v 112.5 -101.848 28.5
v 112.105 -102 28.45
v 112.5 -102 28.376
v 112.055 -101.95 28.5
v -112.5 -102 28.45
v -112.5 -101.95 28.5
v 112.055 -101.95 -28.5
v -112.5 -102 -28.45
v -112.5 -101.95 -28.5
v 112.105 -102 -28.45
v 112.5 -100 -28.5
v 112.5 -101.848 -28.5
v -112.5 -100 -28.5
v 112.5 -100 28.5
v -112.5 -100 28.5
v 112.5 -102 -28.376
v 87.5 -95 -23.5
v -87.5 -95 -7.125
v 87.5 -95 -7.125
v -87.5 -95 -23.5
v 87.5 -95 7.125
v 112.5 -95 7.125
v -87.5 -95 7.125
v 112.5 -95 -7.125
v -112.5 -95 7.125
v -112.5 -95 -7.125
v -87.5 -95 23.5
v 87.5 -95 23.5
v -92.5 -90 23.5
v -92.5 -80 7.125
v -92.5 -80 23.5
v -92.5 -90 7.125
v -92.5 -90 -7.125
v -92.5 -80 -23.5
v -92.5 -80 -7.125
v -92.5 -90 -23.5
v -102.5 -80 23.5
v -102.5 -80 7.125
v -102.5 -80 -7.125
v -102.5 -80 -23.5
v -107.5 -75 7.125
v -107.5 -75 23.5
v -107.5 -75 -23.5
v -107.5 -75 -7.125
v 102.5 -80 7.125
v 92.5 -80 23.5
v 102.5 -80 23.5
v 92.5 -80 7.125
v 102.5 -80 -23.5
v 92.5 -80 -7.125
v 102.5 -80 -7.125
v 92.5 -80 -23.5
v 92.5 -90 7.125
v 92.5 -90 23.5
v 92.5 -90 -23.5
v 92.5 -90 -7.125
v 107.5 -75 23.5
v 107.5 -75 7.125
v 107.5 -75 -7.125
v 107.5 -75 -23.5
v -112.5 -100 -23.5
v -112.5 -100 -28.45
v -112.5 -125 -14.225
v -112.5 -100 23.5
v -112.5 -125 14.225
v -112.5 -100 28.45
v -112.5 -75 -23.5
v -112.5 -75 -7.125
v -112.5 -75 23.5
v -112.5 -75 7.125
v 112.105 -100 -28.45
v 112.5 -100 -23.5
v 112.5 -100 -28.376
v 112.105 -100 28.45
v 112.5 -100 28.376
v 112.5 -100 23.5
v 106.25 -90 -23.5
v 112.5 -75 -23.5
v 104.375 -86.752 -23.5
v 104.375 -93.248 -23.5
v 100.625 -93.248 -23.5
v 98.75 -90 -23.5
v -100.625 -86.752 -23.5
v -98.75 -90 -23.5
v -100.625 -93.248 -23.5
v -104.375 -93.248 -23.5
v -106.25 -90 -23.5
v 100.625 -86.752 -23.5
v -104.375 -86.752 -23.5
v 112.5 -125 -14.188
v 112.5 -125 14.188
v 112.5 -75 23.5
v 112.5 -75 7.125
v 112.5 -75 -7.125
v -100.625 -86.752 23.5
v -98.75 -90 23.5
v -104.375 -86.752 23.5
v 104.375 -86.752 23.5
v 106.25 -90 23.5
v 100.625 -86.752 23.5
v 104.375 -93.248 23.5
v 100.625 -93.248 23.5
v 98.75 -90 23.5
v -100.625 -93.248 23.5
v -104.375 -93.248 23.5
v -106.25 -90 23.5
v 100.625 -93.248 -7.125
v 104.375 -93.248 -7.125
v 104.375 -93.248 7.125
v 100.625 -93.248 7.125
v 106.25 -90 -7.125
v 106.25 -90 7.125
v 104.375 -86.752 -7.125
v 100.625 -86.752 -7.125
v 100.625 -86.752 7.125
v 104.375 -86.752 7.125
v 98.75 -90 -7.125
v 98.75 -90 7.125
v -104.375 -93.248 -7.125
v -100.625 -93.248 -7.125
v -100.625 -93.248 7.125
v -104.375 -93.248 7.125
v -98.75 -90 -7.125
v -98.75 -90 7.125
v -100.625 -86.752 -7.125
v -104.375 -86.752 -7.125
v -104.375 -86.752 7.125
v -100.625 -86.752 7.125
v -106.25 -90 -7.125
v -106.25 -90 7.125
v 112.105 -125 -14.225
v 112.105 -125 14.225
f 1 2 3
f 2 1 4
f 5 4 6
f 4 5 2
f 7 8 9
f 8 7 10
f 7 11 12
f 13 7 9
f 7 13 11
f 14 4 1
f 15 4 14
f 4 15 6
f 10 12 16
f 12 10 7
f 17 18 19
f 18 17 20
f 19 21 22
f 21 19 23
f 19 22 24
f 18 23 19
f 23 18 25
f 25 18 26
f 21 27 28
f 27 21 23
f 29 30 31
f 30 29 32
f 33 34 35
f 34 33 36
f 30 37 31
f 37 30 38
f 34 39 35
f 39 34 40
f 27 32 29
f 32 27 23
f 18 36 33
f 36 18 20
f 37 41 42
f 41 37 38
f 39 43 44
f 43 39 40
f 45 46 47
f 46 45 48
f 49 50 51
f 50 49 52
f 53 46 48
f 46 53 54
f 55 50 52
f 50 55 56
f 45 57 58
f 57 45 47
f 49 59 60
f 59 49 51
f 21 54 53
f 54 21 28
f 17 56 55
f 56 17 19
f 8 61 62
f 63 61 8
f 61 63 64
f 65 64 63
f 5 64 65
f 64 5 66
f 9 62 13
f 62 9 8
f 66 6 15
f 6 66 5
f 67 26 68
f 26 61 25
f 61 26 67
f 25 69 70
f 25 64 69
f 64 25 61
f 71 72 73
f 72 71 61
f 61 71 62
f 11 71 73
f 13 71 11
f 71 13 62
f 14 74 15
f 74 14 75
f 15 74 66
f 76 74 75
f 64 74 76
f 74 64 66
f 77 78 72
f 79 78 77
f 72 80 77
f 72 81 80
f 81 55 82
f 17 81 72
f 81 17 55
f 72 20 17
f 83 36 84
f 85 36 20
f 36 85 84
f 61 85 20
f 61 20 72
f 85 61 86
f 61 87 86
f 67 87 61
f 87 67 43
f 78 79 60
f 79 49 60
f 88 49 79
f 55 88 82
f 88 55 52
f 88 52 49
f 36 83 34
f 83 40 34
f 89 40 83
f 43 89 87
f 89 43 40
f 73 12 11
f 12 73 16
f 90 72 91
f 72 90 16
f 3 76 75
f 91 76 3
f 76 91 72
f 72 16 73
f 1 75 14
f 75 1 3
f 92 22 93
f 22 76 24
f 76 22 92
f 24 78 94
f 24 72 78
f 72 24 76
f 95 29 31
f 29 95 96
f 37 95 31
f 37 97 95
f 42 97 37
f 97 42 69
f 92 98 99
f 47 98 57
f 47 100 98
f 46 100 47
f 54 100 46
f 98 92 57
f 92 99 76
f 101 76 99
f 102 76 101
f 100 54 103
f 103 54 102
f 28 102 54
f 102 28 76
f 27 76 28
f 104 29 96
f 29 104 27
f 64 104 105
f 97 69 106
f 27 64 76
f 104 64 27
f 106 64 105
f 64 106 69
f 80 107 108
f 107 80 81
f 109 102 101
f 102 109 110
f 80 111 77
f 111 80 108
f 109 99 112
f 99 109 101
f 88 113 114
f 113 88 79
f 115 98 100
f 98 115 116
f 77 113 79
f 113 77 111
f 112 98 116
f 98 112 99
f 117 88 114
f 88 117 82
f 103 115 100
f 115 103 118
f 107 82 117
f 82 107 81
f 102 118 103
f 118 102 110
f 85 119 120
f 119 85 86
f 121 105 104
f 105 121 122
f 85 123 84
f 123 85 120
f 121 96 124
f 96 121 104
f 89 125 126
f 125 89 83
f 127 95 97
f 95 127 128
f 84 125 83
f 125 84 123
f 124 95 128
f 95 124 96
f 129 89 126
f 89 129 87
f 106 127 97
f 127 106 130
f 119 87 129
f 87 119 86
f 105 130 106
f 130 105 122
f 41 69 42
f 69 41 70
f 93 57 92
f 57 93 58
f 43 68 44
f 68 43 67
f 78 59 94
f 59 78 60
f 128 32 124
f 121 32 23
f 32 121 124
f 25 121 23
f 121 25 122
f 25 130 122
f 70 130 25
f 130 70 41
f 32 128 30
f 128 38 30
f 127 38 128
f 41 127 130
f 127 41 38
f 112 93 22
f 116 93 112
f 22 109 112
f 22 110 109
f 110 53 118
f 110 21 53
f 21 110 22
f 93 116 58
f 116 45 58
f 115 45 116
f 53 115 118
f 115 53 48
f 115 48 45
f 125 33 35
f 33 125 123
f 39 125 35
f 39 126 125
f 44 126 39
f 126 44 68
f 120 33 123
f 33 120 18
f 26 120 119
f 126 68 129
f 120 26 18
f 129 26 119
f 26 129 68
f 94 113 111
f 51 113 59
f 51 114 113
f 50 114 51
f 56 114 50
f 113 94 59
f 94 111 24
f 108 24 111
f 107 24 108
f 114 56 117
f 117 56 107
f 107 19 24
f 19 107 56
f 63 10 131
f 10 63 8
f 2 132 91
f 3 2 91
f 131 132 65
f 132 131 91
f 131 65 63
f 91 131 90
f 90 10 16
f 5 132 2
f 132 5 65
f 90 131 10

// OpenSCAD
// file: frame-left.scad
/*
 * SPDX-FileCopyrightText: © 2023 Brian S. Stephan <bss@incorporeal.org>
 * SPDX-License-Identifier: GPL-3.0-or-later
 */

include <parameters.scad>
include <components.scad>

module base_left_frame(lower=false) {
	difference() {
		frame(lower=lower);
		// chop the right edge off
		side_chopper();
	}
}

module left_frame(lower=false) {
	difference() {
		base_left_frame(lower=lower);
		// connection holes to other frames
		frame_connection_holes();

		// cable routing hole
		frame_cable_routing_hole();

		// aux button holes
		translate([-35, 101.5, 0]) rotate([270, 0, 0]) aux_control_three_button_cluster();
		translate([-35, (frame_y/2)-neutrik_panel_thickness-4, 0]) frame_cutout();
		translate([-72, (frame_y/2)-neutrik_panel_thickness-4, 0]) frame_cutout();
		translate([2, (frame_y/2)-neutrik_panel_thickness-4, 0]) frame_cutout();

		// neutrix button hole
		translate([frame_center_to_neutrik, (frame_y/2)-neutrik_panel_thickness, 0])
			rotate([90, 0, 0]) neutrik_d_mount();
		translate([frame_center_to_neutrik, (frame_y/2)-neutrik_panel_thickness-4, 0])
			frame_cutout();
	}
}

left_frame();
// file: frame-piece-bottom-left-or-right.scad
/*
 * SPDX-FileCopyrightText: © 2024 Brian S. Stephan <bss@incorporeal.org>
 * SPDX-License-Identifier: GPL-3.0-or-later
 */

include <parameters.scad>
include <components.scad>
use <frame-left.scad>

module bottom_left_or_right_frame_piece(lower=false) {
	piece_width = panel_support_width+frame_wall+frame_mount_column_width;
	intersection() {
		left_frame(lower=lower);
		difference() {
			// include the whole bottom wall (including mount columns)
			translate([0, -(frame_y/2)+(piece_width/2), 0]) cube([frame_x, piece_width, frame_z], center=true);
			// ...minus the frame wall and lip on the left
			translate([-frame_x/2+frame_wall/2, 0, 0])
				cube([frame_wall, frame_y, frame_z], center=true);
			// ...minus a slot for the combining piece to go into
			cube([frame_x, frame_y-(panel_support_width+frame_wall)*2, frame_z/4], center=true);
		}
	}
}

bottom_left_or_right_frame_piece();
// file: parameters.scad
/*
 * SPDX-FileCopyrightText: © 2023 Brian S. Stephan <bss@incorporeal.org>
 * SPDX-License-Identifier: GPL-3.0-or-later
 */

// adjustments
hole_tolerance = 0.15;

// M2
m2_screw_selftap_radius = 0.95;

// M3
m3_screw_selftap_radius = 1.3;

// M4
m4_bolt_radius = 2 + hole_tolerance;
m4_bolt_countersink_radius = 6.1 + hole_tolerance;
m4_bolt_hex_exterior_radius = 3.6 + hole_tolerance;

// 24mm button
small_button_radius = 12 + hole_tolerance;

// 30mm button
big_button_radius = 15 + hole_tolerance;

// JLF mount dimensions
lever_mount_x = 53;
lever_mount_y = 95;
lever_mount_z = 2;

// standard lever hole
lever_plate_hole = 12;

// korean lever hole
korean_lever_plate_hole = 17.6;

// case dimensions
// base frame box. reminder: top of inside (including mounts) is chopped by panel_z for plates
frame_x = 233;
frame_y = 208;
frame_z = 57;

// degree to which the extended frame pieces stick out from the end of the frame
frame_extension_x = 25;
frame_extension_y = 25;

// this sinks the bottom and top of the frame inward a bit, and is used to math out two shapes
// when creating the frame box / overhang panel
frame_bevel_height = 2;
overhang_panel_bevel_height = 1;

frame_center_to_neutrik = 70;

// depth of the "lip" of the frame that the top plate sets into/supports the overhang
frame_wall = 4;

// width of the column in the frame corners to support the hex bolt
frame_mount_column_width = 20;

// per neutrik (mm)
neutrik_panel_thickness = 3;

// top plate, which can either be the whole plate ("inset") or the mounting frame for a plate that overhangs
panel_x = frame_x - (frame_wall * 2);
panel_y = frame_y - (frame_wall * 2);
panel_z = 5;

// how much the top plate x/y is expanded to overhang the frame
// note that this is relative to the top plate (so the wall is added back)
panel_overhang_amount = 8.5;
overhang_panel_x = panel_x + (frame_wall * 2) + (panel_overhang_amount * 2);
overhang_panel_y = panel_y + (frame_wall * 2) + (panel_overhang_amount * 2);

panel_to_frame_point_x = (panel_x/2)-10;
panel_to_frame_point_y = (panel_y/2)-10;

// frame interior that supports the top plates
panel_support_width = 5;

// neutrik D screw holes
neutrik_d_screw_radius = 1.6 + hole_tolerance;
neutrik_d_radius = 12 + hole_tolerance;

// GX 16 holes
gx16_radius = 7.8 + hole_tolerance;

// additional button radius for decorative panels, etc.
decorative_radius_scale = 1.75;
jumbo_decorative_radius_scale = 2;
// main file
/*
 * SPDX-FileCopyrightText: © 2024 Brian S. Stephan <bss@incorporeal.org>
 * SPDX-License-Identifier: GPL-3.0-or-later
 */

include <parameters.scad>
include <components.scad>
use <frame-piece-bottom-left-or-right.scad>

module bottom_piece_wall(lower=false) {
	// get a slice of the piece, to use it in extruding
	projection(cut=true) rotate([-90, 0, 0]) translate([0, frame_y/2-frame_bevel_height, 0])
		bottom_left_or_right_frame_piece(lower=lower);
}

module bottom_piece_extension(lower=false) {
	// combine the original with a shrunken piece to "pull" the wall out
	hull() {
		linear_extrude(height=frame_extension_y) scale([1, 0.5, 1]) bottom_piece_wall();
		linear_extrude(height=frame_bevel_height) bottom_piece_wall(lower=lower);
	}
}

module extended_bottom_left_or_right_frame_piece(lower=false) {
	bottom_left_or_right_frame_piece(lower=lower);
	translate([0, -frame_y/2+frame_bevel_height*2, 0]) rotate([90, 0, 0]) bottom_piece_extension(lower=lower);
}

extended_bottom_left_or_right_frame_piece();
